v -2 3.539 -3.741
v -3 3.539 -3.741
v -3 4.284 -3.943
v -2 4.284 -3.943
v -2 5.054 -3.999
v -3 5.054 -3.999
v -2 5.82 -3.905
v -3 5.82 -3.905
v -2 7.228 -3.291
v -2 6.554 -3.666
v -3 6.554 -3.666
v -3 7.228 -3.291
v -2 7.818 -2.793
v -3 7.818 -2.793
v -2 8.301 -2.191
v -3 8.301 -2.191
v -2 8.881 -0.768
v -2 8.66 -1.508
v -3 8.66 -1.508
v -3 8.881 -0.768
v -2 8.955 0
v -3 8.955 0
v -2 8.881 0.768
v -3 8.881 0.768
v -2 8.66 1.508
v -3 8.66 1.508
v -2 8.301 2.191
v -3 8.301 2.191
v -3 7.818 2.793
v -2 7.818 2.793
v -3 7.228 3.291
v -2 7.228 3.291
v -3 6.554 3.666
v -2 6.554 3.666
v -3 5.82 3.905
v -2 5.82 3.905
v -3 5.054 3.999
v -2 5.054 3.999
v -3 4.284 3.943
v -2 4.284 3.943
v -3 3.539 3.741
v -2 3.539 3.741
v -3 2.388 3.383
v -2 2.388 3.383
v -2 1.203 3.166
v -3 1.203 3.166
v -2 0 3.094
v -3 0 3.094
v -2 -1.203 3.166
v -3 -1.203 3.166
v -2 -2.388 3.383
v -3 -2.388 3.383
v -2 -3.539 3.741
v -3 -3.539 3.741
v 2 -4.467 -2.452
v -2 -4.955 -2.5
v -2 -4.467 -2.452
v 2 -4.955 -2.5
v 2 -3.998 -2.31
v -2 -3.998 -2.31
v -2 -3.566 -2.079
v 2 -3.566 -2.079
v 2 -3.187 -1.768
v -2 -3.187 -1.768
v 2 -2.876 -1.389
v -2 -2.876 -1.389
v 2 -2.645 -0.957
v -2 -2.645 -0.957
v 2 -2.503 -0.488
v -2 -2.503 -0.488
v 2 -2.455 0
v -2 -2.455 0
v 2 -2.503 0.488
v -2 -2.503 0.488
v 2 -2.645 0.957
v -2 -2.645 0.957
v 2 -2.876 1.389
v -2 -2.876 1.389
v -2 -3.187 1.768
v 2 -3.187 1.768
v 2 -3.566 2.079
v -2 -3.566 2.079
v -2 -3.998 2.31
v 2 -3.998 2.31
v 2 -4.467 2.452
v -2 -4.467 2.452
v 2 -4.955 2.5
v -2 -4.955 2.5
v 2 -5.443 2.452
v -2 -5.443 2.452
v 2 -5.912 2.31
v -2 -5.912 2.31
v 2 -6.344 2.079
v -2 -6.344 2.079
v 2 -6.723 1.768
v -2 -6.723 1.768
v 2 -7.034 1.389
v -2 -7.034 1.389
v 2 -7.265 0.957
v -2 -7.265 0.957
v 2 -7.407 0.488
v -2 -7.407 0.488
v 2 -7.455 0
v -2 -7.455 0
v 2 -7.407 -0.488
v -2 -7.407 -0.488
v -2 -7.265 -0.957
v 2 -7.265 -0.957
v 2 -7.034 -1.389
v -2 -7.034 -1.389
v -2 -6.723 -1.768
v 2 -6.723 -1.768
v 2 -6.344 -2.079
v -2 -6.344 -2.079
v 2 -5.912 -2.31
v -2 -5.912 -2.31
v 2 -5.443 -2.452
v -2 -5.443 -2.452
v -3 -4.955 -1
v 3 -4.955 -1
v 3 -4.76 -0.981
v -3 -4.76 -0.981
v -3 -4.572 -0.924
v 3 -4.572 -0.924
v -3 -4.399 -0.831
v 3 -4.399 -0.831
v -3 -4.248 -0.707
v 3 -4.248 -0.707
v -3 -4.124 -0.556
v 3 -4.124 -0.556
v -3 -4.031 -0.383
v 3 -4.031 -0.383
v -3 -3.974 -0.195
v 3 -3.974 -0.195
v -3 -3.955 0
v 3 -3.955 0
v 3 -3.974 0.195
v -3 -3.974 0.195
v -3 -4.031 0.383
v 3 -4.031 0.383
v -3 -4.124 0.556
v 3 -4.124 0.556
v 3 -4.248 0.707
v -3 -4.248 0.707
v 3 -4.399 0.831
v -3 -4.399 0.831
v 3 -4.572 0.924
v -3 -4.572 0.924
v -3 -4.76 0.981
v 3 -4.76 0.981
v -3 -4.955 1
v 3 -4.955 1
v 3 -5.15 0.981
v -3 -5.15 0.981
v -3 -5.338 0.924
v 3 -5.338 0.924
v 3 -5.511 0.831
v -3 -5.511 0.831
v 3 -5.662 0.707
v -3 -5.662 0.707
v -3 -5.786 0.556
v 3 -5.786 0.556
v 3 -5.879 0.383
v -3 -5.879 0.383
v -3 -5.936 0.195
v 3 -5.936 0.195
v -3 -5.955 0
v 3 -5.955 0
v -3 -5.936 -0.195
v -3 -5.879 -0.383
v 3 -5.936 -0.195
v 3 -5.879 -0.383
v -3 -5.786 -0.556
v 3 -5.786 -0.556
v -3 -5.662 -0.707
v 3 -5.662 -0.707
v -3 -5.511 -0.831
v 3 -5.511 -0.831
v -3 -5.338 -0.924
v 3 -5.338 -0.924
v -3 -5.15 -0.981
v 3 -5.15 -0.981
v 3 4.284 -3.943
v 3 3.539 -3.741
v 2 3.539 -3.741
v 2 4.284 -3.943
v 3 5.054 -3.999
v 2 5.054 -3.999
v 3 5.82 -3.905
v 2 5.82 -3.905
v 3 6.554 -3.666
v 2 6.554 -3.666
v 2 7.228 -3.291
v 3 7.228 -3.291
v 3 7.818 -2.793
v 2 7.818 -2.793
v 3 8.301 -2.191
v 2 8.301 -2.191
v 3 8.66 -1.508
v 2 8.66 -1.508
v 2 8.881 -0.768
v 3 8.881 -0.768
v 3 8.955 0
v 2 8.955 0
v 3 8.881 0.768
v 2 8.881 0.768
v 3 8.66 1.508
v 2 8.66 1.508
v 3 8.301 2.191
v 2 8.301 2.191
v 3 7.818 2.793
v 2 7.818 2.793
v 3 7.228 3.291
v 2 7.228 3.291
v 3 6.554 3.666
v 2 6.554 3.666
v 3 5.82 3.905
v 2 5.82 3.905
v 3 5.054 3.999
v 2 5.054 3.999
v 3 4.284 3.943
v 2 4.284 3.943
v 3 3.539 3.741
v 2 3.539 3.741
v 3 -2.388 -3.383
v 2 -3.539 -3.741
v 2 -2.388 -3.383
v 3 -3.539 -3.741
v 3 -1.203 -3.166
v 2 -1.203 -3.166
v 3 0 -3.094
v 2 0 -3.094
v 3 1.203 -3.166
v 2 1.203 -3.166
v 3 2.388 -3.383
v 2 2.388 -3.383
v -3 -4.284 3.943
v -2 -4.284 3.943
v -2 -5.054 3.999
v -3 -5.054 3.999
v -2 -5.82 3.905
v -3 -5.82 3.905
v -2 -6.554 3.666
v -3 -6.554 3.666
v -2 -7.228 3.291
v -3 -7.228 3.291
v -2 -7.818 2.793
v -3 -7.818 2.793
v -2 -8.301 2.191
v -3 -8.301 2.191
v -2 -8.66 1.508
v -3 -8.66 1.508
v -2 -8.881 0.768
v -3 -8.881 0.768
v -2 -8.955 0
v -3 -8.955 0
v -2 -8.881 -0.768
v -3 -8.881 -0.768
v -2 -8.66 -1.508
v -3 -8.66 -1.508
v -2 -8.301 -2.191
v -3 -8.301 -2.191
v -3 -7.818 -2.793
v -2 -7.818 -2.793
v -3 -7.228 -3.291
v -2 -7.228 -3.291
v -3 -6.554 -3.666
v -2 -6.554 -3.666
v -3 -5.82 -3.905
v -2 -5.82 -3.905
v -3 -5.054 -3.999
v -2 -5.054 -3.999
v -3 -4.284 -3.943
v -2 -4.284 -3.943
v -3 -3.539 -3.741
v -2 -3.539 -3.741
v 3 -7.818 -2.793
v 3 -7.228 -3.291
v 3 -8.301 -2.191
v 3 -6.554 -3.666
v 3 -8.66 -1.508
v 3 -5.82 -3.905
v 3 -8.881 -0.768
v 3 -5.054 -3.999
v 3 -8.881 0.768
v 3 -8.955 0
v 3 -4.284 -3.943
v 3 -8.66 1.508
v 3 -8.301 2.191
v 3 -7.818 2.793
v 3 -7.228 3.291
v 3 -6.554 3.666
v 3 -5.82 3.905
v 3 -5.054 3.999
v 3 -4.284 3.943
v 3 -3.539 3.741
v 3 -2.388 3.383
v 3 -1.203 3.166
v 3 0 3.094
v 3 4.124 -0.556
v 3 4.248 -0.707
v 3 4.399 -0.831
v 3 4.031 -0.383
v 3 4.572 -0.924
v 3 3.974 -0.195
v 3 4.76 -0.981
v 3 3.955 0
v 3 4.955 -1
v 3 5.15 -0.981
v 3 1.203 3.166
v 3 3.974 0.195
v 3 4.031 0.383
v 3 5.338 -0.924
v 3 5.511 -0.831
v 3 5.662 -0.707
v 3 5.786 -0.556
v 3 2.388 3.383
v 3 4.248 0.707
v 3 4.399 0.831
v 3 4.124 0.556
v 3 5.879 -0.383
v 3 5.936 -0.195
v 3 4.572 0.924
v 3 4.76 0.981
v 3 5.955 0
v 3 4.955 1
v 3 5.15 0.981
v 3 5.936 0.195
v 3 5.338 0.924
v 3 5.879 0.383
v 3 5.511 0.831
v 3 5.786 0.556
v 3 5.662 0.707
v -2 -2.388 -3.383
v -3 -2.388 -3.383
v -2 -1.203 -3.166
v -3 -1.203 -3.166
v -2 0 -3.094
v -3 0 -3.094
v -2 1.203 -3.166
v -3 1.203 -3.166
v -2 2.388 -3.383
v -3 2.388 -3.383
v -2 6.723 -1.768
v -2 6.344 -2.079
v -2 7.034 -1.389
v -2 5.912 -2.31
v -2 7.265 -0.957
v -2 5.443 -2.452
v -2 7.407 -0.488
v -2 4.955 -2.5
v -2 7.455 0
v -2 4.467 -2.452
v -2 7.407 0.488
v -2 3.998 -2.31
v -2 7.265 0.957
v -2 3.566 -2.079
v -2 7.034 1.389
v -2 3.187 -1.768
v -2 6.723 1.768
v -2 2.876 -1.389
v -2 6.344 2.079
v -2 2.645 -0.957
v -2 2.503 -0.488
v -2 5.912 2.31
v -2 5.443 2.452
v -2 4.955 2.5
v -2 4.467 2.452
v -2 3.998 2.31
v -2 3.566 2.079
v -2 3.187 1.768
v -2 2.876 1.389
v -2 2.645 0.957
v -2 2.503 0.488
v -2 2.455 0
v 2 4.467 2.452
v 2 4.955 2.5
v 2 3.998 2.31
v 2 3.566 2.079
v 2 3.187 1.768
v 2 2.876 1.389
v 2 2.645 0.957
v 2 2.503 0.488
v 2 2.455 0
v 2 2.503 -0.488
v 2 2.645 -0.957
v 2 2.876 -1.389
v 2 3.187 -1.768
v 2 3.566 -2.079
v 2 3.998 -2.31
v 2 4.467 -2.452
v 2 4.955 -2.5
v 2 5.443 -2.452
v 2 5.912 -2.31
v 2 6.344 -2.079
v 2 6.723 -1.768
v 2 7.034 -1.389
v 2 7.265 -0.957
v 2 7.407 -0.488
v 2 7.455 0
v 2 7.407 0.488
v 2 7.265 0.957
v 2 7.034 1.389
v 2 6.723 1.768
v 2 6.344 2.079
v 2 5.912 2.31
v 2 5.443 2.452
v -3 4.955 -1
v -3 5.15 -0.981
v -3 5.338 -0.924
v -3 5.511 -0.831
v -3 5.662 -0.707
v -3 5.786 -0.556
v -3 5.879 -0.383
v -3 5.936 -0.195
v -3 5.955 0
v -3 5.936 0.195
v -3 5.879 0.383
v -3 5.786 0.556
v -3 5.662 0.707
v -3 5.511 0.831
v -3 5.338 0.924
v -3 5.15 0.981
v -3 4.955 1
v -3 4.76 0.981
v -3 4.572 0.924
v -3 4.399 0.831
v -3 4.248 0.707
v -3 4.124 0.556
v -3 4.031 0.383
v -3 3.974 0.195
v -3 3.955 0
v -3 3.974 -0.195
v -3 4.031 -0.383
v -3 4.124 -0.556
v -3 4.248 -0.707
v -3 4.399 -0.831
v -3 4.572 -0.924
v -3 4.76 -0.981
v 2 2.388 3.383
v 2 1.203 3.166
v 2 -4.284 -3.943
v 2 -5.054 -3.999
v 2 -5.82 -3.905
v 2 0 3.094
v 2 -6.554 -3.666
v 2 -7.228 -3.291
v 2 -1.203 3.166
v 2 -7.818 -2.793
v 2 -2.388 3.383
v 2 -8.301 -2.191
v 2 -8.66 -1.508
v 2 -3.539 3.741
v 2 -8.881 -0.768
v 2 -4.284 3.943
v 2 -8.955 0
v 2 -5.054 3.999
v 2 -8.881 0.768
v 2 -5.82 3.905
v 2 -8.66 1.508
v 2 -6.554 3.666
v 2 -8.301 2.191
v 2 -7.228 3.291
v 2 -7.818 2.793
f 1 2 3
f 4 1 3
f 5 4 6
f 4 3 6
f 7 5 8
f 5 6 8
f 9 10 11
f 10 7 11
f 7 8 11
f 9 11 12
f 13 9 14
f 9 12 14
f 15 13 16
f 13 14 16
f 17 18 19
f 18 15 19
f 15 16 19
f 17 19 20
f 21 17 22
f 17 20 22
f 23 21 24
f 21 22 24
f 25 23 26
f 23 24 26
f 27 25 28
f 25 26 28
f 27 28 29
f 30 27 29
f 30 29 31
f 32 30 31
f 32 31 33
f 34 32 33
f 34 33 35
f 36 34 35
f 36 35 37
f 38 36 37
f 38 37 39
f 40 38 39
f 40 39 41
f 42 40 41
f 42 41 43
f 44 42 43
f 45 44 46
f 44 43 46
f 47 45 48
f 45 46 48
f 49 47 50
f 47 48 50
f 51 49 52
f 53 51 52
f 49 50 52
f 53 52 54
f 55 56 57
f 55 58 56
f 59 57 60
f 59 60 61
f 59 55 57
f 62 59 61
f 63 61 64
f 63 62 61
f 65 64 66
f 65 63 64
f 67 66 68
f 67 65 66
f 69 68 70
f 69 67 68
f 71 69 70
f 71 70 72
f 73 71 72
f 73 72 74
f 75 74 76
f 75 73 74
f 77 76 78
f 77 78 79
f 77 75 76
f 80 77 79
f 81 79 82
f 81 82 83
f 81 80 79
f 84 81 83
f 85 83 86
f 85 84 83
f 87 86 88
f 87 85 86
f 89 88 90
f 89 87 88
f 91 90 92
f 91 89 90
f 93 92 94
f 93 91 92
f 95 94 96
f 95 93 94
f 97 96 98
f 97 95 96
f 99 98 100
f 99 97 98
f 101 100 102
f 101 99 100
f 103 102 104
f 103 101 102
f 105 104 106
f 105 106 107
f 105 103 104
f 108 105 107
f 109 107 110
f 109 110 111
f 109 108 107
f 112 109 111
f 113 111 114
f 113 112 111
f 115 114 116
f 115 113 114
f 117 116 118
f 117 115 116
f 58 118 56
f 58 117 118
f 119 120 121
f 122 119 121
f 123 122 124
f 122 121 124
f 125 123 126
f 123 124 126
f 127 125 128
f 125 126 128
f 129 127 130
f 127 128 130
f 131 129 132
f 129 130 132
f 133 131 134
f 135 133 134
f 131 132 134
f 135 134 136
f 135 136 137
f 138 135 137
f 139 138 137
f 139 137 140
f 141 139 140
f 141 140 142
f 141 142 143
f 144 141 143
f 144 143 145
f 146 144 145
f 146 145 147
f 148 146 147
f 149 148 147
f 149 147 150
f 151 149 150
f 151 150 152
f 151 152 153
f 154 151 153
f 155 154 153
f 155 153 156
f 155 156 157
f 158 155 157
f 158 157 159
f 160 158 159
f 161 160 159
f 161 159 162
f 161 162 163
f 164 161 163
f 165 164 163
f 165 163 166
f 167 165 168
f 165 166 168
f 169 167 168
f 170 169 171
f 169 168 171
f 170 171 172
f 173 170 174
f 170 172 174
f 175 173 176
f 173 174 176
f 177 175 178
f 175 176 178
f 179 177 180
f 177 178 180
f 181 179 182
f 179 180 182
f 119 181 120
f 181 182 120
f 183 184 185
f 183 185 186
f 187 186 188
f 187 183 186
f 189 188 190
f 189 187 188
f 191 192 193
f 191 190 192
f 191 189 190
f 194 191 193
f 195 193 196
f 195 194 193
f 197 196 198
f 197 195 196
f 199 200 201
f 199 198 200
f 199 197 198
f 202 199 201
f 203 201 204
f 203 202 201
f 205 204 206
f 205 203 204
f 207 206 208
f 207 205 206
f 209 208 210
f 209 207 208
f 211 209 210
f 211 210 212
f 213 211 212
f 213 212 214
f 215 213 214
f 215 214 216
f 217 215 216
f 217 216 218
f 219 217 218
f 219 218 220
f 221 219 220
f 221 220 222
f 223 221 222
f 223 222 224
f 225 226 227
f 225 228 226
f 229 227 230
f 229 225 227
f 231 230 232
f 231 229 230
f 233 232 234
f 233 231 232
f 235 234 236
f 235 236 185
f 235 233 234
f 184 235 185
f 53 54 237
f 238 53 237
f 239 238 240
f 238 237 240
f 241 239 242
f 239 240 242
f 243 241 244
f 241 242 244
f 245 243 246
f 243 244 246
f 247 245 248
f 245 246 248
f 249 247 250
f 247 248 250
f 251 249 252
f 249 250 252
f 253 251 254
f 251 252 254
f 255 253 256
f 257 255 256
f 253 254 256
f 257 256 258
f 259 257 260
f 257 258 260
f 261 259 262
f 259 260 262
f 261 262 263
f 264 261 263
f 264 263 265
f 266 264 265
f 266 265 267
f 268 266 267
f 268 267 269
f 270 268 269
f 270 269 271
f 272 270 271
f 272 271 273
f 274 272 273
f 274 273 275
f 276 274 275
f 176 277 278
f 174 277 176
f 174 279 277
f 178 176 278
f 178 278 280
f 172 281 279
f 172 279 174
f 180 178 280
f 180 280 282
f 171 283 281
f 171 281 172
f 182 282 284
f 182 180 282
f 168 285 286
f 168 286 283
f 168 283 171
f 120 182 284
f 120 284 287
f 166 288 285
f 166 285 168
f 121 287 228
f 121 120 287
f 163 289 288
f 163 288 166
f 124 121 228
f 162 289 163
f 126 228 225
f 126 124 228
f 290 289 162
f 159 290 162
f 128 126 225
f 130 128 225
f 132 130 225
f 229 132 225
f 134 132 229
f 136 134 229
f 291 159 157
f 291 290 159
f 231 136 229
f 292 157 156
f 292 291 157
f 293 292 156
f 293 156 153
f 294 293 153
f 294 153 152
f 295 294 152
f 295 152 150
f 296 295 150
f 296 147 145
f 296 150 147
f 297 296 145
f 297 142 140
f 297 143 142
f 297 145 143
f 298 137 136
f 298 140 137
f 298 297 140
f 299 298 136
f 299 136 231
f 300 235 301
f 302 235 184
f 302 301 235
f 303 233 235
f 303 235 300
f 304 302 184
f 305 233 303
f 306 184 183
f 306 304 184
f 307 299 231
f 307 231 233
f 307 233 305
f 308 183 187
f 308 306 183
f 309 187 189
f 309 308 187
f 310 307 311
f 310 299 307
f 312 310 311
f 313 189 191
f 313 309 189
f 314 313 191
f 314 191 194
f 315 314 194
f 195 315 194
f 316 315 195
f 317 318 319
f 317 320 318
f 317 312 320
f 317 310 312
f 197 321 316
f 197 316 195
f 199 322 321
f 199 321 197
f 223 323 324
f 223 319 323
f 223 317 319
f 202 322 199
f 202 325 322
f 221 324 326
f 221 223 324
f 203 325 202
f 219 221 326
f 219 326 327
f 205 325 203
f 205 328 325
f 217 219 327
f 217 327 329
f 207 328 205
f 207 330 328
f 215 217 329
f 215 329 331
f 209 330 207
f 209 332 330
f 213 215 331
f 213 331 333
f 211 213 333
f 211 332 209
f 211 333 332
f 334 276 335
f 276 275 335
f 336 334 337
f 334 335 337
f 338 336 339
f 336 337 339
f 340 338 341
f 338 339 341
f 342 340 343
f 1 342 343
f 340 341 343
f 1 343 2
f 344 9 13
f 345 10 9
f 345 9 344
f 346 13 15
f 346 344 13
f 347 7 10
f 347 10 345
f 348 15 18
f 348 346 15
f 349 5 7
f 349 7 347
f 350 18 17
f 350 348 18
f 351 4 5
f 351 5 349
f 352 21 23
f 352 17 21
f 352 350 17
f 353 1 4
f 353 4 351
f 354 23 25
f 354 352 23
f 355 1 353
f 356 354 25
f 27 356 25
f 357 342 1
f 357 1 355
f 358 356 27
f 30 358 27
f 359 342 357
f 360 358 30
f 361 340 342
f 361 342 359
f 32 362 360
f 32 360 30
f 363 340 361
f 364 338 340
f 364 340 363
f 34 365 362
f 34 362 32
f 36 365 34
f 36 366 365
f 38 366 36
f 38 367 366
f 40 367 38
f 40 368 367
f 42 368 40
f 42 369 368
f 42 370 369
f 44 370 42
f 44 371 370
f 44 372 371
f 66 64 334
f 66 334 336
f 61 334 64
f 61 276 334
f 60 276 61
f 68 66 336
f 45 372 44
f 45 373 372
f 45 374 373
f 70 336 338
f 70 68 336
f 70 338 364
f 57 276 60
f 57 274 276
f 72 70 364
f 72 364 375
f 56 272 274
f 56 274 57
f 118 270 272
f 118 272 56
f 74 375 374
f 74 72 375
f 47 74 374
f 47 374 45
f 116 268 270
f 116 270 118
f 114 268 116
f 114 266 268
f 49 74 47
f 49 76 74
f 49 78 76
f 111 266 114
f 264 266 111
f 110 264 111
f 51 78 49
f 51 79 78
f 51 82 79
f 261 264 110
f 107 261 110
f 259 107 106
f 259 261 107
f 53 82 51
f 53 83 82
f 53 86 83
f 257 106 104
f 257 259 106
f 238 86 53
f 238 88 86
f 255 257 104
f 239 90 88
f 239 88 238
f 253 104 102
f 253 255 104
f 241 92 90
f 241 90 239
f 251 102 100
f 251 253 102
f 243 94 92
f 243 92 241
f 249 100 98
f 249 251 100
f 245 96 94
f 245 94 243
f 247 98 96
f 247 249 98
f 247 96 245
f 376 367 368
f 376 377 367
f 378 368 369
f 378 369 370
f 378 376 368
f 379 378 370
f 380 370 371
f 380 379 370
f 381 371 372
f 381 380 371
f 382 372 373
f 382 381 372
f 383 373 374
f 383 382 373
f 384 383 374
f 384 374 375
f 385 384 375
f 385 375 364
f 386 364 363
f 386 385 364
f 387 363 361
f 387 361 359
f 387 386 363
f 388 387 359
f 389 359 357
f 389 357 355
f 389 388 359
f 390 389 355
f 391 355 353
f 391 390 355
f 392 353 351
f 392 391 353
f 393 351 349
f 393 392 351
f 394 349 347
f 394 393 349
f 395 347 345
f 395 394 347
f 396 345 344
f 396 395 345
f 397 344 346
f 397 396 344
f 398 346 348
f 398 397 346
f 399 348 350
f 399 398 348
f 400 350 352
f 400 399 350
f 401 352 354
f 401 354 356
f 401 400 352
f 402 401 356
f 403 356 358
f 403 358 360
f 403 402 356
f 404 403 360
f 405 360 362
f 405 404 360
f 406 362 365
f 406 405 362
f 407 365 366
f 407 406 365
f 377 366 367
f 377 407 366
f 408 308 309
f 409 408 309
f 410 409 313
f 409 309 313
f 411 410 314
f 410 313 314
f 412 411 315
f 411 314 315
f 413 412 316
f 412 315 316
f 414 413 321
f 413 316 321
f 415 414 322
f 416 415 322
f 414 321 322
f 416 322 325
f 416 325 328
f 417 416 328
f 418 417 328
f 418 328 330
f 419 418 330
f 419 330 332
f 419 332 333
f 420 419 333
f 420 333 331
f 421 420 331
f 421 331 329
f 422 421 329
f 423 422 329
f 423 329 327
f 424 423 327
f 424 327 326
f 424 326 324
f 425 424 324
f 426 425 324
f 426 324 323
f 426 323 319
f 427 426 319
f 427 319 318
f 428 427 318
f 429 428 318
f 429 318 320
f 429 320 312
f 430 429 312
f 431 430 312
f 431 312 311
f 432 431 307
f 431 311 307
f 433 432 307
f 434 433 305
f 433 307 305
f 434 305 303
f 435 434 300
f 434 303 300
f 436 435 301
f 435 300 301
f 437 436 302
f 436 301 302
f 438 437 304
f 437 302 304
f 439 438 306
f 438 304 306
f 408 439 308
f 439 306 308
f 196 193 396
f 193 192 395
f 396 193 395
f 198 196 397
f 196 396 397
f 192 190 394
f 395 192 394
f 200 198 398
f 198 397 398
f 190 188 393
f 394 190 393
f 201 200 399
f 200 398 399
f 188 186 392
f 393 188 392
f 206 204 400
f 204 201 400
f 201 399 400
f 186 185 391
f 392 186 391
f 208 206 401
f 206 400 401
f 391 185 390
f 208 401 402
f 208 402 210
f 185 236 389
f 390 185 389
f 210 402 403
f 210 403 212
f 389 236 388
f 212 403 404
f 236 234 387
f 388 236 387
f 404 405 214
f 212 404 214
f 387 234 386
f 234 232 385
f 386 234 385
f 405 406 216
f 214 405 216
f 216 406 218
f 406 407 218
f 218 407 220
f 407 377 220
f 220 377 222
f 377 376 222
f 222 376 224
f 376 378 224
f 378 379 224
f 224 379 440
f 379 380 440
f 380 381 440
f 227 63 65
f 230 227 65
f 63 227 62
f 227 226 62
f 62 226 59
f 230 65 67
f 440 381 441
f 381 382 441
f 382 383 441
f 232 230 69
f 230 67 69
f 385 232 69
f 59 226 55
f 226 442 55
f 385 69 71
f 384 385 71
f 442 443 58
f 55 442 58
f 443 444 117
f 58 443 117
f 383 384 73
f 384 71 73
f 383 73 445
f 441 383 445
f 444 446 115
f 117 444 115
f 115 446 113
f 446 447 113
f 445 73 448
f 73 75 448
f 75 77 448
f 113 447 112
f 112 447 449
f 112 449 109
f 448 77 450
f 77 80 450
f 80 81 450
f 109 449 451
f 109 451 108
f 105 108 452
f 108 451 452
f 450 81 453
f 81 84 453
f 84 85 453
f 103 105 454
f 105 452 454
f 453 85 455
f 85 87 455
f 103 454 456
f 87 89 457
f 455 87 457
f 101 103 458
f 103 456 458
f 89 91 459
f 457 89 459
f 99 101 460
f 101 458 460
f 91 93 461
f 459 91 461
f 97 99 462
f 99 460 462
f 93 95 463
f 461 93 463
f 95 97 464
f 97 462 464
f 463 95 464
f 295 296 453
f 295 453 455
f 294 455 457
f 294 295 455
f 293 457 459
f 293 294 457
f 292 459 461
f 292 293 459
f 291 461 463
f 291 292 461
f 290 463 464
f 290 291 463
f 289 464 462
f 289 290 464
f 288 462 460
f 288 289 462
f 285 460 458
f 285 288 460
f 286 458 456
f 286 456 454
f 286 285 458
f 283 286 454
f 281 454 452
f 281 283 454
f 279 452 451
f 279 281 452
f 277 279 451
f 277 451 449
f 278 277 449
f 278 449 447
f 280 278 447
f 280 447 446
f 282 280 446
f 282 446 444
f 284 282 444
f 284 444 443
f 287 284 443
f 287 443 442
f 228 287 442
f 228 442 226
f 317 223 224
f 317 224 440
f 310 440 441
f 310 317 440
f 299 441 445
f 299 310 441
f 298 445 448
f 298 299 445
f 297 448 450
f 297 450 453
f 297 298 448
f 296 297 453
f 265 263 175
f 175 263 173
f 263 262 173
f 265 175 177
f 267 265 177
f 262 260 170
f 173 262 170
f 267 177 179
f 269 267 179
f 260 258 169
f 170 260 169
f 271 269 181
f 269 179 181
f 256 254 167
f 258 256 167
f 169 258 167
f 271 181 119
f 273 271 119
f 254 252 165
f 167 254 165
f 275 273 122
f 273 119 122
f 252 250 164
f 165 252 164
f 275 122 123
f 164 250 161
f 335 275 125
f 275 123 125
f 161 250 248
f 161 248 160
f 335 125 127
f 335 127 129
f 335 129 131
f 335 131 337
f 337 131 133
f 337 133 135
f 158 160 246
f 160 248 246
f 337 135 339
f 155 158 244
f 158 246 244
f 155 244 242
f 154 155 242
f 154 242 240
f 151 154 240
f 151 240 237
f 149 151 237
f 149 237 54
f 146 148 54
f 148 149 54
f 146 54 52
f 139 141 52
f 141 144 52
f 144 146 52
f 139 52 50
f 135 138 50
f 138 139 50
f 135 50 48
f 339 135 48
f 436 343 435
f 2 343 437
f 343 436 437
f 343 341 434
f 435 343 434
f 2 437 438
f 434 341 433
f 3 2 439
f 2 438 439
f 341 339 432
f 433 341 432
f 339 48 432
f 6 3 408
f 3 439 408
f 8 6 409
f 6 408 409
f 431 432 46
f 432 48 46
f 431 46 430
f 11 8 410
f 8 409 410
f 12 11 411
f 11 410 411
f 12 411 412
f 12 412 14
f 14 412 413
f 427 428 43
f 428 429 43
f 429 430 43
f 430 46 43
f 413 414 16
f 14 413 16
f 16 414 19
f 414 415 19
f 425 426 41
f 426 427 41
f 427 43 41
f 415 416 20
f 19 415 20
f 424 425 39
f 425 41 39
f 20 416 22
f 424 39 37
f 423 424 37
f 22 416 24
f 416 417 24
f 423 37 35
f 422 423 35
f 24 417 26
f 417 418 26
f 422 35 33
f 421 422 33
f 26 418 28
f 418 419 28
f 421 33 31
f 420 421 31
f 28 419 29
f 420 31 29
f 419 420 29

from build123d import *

# Parameters (mm, degrees)
SKETCH1_R             = 2.5
BOSS_EXTRUDE1_DEPTH   = 2.5
BOSS_EXTRUDE1_2_DEPTH = 2.5
SKETCH2_R             = 4
SKETCH2_R_2           = 2.5
BOSS_EXTRUDE2_DEPTH   = 0.5
SKETCH3_R             = 1
CUT_EXTRUDE1_DEPTH    = 12.497479072


with BuildPart() as part:
    # Sketch1 → Boss-Extrude1 (new, symmetric)
    with BuildSketch(Plane.YZ):
        with Locations(Location((-4.955, 0, 0), (0, 0, 270))):
            Circle(SKETCH1_R)
    extrude(amount=BOSS_EXTRUDE1_DEPTH, both=True)



with BuildPart() as body_2:
    # Sketch1 → Boss-Extrude1 2 (new, symmetric)
    with BuildSketch(Plane.YZ):
        with Locations(Location((4.955, 0, 0), (0, 0, 90))):
            Circle(SKETCH1_R)
    extrude(amount=BOSS_EXTRUDE1_2_DEPTH, both=True)


with BuildPart() as part_1:
    add(part.part)

    add(body_2.part)  # Boss-Extrude2 merges body 2
    # Sketch2 → Boss-Extrude2 (add, symmetric)
    # profile 1 of 4: a face of its own
    with BuildSketch(Plane.YZ.offset(2.5)):
        with Locations((-4.955, 0)):
            Circle(SKETCH2_R)
    # profile 2 of 4: a face of its own
    with BuildSketch(Plane.YZ.offset(2.5)):
        with BuildLine():
            ThreePointArc((-3.539285714, 3.741089823), (-1.663886424, 2.273449236), (-0.955, 0))
            ThreePointArc((-0.955, 0), (-1.663886424, -2.273449236), (-3.539285714, -3.741089823))
            ThreePointArc((-3.539285714, -3.741089823), (0, -3.093814379), (3.539285714, -3.741089823))
            ThreePointArc((3.539285714, -3.741089823), (0.955, 0), (3.539285714, 3.741089823))
            ThreePointArc((3.539285714, 3.741089823), (0, 3.093814379), (-3.539285714, 3.741089823))
        make_face()
    # profile 3 of 4: a face of its own
    with BuildSketch(Plane.YZ.offset(2.5)):
        with Locations((4.955, 0)):
            Circle(SKETCH2_R)
        with Locations(Location((4.955, 0, 0), (0, 0, 90))):
            Circle(SKETCH2_R_2, mode=Mode.SUBTRACT)
    # profile 4 of 4: a face of its own
    with BuildSketch(Plane.YZ.offset(2.5)):
        with Locations(Location((4.955, 0, 0), (0, 0, 90))):
            Circle(SKETCH2_R_2)
    boss_extrude2 = extrude(amount=BOSS_EXTRUDE2_DEPTH, both=True)

    # Mirror1: Boss-Extrude2 across plane
    add(boss_extrude2.mirror(Plane(origin=(0, 0, 0), x_dir=(0, 0, 1), z_dir=(1, 0, 0))))

    # Sketch3 → Cut-Extrude1 (cut, through all)
    with BuildSketch(Plane.YZ.offset(3)):
        with Locations(Location((-4.955, 0, 0), (0, 0, 270))):
            Circle(SKETCH3_R)
        with Locations(Location((4.955, 0, 0), (0, 0, 270))):
            Circle(SKETCH3_R)
    extrude(amount=-CUT_EXTRUDE1_DEPTH, mode=Mode.SUBTRACT)


solid = part_1.part
